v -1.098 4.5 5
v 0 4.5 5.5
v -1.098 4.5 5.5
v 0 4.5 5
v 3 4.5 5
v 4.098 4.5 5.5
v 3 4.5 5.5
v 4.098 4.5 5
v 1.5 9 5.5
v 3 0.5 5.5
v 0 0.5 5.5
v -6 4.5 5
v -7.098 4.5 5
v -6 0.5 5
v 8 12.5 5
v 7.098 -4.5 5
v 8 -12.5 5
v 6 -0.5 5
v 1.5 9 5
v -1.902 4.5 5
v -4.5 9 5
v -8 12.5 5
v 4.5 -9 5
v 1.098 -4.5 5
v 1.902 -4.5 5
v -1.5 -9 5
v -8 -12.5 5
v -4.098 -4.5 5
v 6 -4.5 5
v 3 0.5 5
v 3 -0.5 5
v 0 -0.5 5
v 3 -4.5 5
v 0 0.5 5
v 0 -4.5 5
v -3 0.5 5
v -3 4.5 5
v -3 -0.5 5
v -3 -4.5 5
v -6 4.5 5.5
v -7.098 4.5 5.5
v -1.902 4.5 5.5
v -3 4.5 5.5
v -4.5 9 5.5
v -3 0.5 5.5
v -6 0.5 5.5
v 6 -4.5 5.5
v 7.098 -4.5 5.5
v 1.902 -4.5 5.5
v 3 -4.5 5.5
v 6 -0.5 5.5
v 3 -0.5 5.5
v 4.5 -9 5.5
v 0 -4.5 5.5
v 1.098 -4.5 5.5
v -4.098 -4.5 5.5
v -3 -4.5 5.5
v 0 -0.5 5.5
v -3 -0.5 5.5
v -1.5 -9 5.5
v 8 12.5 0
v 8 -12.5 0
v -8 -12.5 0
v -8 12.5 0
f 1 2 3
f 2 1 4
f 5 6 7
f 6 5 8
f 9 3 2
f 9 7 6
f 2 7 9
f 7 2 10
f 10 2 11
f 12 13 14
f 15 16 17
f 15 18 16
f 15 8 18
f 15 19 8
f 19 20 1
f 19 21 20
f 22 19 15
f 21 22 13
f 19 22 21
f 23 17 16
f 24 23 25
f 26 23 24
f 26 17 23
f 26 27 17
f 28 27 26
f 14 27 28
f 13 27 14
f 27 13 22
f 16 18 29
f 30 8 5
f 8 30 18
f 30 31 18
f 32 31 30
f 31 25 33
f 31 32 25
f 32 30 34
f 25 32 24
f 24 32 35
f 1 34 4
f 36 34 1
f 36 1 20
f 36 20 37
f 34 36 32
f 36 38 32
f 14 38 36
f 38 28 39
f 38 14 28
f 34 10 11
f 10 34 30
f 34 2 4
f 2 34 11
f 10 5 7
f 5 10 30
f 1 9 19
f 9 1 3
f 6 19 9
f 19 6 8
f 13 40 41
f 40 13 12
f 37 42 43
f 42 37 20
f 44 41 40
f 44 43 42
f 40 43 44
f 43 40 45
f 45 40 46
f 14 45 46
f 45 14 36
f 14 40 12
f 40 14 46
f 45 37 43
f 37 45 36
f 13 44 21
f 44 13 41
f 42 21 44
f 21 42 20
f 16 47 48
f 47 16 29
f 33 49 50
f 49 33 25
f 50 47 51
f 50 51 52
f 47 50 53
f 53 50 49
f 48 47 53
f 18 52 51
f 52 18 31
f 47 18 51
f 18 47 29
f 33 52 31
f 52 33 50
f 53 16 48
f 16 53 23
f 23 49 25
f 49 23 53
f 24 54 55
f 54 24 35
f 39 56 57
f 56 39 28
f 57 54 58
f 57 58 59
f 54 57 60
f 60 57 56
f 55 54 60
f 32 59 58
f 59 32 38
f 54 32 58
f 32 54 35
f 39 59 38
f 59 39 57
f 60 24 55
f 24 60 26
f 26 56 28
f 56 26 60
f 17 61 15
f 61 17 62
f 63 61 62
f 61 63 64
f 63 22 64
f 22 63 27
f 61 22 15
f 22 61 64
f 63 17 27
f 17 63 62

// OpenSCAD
// file: common.scad
module arrow() {
    union() {
        translate([-3,-1.5,0]) cube([4,3,0.5]);
        translate([2.5,0,0]) cylinder(0.5,3,3,$fn=3);
    }
}
// main file
use <common.scad>;

color([0,0.75,1]) translate([-8,-12.5,0]) cube([16,25,5]);

color([1,1,1]) translate([1.5,3.5,5]) rotate(90) arrow();
color([1,1,1]) translate([-4.5,3.5,5]) rotate(90) arrow();

color([1,1,1]) translate([4.5,-3.5,5]) rotate(270) arrow();
color([1,1,1]) translate([-1.5,-3.5,5]) rotate(270) arrow();
